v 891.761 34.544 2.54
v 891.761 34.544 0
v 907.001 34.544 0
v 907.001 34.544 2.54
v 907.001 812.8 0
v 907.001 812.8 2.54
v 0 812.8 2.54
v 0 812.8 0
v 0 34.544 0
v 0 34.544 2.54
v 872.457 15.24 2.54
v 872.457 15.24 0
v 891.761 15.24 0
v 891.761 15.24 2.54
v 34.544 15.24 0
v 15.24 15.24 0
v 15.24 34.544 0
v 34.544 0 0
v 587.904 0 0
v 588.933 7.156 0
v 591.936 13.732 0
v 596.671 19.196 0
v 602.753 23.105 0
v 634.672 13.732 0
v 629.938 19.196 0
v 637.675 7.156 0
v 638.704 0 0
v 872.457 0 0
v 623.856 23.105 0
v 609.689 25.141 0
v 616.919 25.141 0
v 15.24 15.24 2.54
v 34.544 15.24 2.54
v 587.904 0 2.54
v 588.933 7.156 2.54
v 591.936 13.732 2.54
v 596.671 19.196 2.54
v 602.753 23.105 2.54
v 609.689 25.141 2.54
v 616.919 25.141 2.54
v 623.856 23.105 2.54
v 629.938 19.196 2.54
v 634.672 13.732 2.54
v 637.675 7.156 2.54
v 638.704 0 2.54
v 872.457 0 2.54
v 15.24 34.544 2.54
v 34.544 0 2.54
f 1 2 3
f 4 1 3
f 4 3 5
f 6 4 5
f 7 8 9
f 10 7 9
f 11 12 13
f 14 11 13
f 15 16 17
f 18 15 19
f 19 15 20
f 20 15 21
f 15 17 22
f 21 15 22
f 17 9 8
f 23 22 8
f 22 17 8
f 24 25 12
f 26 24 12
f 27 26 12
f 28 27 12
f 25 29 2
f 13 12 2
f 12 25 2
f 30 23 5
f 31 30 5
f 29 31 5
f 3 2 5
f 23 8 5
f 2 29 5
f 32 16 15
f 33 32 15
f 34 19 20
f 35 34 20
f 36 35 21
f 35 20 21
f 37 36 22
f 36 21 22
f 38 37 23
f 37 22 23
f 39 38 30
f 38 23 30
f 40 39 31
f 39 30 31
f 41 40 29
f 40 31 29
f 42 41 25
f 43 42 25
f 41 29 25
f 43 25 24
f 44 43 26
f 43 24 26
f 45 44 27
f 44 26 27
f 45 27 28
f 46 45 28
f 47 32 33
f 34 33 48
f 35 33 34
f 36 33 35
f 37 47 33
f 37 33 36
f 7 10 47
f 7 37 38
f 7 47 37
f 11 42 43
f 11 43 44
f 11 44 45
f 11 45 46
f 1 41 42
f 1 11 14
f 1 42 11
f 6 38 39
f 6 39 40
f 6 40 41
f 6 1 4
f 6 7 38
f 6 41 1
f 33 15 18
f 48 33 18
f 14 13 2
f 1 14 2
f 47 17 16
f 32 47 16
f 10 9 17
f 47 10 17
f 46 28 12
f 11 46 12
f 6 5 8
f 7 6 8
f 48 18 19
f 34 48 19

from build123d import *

# Parameters (mm, degrees)
BOSS_EXTRUDE1_DEPTH = 2.54


with BuildPart() as part:
    # Sketch1 → Boss-Extrude1 (new body)
    with BuildSketch(Plane.XY):
        with BuildLine():
            Line((0, 812.8), (0, 34.544))
            Line((0, 34.544), (15.24, 34.544))
            Line((15.24, 34.544), (15.24, 15.24))
            Line((15.24, 15.24), (34.544, 15.24))
            Line((34.544, 15.24), (34.544, 0))
            Line((34.544, 0), (587.904273944, 0))
            ThreePointArc((587.904273944, 0), (613.304273944, 25.4), (638.704273944, 0))
            Line((638.704273944, 0), (872.45698, 0))
            Line((872.45698, 0), (872.45698, 15.24))
            Line((872.45698, 15.24), (891.76098, 15.24))
            Line((891.76098, 15.24), (891.76098, 34.544))
            Line((891.76098, 34.544), (907.00098, 34.544))
            Line((907.00098, 34.544), (907.00098, 812.8))
            Line((907.00098, 812.8), (0, 812.8))
        make_face()
    extrude(amount=BOSS_EXTRUDE1_DEPTH)


solid = part.part
